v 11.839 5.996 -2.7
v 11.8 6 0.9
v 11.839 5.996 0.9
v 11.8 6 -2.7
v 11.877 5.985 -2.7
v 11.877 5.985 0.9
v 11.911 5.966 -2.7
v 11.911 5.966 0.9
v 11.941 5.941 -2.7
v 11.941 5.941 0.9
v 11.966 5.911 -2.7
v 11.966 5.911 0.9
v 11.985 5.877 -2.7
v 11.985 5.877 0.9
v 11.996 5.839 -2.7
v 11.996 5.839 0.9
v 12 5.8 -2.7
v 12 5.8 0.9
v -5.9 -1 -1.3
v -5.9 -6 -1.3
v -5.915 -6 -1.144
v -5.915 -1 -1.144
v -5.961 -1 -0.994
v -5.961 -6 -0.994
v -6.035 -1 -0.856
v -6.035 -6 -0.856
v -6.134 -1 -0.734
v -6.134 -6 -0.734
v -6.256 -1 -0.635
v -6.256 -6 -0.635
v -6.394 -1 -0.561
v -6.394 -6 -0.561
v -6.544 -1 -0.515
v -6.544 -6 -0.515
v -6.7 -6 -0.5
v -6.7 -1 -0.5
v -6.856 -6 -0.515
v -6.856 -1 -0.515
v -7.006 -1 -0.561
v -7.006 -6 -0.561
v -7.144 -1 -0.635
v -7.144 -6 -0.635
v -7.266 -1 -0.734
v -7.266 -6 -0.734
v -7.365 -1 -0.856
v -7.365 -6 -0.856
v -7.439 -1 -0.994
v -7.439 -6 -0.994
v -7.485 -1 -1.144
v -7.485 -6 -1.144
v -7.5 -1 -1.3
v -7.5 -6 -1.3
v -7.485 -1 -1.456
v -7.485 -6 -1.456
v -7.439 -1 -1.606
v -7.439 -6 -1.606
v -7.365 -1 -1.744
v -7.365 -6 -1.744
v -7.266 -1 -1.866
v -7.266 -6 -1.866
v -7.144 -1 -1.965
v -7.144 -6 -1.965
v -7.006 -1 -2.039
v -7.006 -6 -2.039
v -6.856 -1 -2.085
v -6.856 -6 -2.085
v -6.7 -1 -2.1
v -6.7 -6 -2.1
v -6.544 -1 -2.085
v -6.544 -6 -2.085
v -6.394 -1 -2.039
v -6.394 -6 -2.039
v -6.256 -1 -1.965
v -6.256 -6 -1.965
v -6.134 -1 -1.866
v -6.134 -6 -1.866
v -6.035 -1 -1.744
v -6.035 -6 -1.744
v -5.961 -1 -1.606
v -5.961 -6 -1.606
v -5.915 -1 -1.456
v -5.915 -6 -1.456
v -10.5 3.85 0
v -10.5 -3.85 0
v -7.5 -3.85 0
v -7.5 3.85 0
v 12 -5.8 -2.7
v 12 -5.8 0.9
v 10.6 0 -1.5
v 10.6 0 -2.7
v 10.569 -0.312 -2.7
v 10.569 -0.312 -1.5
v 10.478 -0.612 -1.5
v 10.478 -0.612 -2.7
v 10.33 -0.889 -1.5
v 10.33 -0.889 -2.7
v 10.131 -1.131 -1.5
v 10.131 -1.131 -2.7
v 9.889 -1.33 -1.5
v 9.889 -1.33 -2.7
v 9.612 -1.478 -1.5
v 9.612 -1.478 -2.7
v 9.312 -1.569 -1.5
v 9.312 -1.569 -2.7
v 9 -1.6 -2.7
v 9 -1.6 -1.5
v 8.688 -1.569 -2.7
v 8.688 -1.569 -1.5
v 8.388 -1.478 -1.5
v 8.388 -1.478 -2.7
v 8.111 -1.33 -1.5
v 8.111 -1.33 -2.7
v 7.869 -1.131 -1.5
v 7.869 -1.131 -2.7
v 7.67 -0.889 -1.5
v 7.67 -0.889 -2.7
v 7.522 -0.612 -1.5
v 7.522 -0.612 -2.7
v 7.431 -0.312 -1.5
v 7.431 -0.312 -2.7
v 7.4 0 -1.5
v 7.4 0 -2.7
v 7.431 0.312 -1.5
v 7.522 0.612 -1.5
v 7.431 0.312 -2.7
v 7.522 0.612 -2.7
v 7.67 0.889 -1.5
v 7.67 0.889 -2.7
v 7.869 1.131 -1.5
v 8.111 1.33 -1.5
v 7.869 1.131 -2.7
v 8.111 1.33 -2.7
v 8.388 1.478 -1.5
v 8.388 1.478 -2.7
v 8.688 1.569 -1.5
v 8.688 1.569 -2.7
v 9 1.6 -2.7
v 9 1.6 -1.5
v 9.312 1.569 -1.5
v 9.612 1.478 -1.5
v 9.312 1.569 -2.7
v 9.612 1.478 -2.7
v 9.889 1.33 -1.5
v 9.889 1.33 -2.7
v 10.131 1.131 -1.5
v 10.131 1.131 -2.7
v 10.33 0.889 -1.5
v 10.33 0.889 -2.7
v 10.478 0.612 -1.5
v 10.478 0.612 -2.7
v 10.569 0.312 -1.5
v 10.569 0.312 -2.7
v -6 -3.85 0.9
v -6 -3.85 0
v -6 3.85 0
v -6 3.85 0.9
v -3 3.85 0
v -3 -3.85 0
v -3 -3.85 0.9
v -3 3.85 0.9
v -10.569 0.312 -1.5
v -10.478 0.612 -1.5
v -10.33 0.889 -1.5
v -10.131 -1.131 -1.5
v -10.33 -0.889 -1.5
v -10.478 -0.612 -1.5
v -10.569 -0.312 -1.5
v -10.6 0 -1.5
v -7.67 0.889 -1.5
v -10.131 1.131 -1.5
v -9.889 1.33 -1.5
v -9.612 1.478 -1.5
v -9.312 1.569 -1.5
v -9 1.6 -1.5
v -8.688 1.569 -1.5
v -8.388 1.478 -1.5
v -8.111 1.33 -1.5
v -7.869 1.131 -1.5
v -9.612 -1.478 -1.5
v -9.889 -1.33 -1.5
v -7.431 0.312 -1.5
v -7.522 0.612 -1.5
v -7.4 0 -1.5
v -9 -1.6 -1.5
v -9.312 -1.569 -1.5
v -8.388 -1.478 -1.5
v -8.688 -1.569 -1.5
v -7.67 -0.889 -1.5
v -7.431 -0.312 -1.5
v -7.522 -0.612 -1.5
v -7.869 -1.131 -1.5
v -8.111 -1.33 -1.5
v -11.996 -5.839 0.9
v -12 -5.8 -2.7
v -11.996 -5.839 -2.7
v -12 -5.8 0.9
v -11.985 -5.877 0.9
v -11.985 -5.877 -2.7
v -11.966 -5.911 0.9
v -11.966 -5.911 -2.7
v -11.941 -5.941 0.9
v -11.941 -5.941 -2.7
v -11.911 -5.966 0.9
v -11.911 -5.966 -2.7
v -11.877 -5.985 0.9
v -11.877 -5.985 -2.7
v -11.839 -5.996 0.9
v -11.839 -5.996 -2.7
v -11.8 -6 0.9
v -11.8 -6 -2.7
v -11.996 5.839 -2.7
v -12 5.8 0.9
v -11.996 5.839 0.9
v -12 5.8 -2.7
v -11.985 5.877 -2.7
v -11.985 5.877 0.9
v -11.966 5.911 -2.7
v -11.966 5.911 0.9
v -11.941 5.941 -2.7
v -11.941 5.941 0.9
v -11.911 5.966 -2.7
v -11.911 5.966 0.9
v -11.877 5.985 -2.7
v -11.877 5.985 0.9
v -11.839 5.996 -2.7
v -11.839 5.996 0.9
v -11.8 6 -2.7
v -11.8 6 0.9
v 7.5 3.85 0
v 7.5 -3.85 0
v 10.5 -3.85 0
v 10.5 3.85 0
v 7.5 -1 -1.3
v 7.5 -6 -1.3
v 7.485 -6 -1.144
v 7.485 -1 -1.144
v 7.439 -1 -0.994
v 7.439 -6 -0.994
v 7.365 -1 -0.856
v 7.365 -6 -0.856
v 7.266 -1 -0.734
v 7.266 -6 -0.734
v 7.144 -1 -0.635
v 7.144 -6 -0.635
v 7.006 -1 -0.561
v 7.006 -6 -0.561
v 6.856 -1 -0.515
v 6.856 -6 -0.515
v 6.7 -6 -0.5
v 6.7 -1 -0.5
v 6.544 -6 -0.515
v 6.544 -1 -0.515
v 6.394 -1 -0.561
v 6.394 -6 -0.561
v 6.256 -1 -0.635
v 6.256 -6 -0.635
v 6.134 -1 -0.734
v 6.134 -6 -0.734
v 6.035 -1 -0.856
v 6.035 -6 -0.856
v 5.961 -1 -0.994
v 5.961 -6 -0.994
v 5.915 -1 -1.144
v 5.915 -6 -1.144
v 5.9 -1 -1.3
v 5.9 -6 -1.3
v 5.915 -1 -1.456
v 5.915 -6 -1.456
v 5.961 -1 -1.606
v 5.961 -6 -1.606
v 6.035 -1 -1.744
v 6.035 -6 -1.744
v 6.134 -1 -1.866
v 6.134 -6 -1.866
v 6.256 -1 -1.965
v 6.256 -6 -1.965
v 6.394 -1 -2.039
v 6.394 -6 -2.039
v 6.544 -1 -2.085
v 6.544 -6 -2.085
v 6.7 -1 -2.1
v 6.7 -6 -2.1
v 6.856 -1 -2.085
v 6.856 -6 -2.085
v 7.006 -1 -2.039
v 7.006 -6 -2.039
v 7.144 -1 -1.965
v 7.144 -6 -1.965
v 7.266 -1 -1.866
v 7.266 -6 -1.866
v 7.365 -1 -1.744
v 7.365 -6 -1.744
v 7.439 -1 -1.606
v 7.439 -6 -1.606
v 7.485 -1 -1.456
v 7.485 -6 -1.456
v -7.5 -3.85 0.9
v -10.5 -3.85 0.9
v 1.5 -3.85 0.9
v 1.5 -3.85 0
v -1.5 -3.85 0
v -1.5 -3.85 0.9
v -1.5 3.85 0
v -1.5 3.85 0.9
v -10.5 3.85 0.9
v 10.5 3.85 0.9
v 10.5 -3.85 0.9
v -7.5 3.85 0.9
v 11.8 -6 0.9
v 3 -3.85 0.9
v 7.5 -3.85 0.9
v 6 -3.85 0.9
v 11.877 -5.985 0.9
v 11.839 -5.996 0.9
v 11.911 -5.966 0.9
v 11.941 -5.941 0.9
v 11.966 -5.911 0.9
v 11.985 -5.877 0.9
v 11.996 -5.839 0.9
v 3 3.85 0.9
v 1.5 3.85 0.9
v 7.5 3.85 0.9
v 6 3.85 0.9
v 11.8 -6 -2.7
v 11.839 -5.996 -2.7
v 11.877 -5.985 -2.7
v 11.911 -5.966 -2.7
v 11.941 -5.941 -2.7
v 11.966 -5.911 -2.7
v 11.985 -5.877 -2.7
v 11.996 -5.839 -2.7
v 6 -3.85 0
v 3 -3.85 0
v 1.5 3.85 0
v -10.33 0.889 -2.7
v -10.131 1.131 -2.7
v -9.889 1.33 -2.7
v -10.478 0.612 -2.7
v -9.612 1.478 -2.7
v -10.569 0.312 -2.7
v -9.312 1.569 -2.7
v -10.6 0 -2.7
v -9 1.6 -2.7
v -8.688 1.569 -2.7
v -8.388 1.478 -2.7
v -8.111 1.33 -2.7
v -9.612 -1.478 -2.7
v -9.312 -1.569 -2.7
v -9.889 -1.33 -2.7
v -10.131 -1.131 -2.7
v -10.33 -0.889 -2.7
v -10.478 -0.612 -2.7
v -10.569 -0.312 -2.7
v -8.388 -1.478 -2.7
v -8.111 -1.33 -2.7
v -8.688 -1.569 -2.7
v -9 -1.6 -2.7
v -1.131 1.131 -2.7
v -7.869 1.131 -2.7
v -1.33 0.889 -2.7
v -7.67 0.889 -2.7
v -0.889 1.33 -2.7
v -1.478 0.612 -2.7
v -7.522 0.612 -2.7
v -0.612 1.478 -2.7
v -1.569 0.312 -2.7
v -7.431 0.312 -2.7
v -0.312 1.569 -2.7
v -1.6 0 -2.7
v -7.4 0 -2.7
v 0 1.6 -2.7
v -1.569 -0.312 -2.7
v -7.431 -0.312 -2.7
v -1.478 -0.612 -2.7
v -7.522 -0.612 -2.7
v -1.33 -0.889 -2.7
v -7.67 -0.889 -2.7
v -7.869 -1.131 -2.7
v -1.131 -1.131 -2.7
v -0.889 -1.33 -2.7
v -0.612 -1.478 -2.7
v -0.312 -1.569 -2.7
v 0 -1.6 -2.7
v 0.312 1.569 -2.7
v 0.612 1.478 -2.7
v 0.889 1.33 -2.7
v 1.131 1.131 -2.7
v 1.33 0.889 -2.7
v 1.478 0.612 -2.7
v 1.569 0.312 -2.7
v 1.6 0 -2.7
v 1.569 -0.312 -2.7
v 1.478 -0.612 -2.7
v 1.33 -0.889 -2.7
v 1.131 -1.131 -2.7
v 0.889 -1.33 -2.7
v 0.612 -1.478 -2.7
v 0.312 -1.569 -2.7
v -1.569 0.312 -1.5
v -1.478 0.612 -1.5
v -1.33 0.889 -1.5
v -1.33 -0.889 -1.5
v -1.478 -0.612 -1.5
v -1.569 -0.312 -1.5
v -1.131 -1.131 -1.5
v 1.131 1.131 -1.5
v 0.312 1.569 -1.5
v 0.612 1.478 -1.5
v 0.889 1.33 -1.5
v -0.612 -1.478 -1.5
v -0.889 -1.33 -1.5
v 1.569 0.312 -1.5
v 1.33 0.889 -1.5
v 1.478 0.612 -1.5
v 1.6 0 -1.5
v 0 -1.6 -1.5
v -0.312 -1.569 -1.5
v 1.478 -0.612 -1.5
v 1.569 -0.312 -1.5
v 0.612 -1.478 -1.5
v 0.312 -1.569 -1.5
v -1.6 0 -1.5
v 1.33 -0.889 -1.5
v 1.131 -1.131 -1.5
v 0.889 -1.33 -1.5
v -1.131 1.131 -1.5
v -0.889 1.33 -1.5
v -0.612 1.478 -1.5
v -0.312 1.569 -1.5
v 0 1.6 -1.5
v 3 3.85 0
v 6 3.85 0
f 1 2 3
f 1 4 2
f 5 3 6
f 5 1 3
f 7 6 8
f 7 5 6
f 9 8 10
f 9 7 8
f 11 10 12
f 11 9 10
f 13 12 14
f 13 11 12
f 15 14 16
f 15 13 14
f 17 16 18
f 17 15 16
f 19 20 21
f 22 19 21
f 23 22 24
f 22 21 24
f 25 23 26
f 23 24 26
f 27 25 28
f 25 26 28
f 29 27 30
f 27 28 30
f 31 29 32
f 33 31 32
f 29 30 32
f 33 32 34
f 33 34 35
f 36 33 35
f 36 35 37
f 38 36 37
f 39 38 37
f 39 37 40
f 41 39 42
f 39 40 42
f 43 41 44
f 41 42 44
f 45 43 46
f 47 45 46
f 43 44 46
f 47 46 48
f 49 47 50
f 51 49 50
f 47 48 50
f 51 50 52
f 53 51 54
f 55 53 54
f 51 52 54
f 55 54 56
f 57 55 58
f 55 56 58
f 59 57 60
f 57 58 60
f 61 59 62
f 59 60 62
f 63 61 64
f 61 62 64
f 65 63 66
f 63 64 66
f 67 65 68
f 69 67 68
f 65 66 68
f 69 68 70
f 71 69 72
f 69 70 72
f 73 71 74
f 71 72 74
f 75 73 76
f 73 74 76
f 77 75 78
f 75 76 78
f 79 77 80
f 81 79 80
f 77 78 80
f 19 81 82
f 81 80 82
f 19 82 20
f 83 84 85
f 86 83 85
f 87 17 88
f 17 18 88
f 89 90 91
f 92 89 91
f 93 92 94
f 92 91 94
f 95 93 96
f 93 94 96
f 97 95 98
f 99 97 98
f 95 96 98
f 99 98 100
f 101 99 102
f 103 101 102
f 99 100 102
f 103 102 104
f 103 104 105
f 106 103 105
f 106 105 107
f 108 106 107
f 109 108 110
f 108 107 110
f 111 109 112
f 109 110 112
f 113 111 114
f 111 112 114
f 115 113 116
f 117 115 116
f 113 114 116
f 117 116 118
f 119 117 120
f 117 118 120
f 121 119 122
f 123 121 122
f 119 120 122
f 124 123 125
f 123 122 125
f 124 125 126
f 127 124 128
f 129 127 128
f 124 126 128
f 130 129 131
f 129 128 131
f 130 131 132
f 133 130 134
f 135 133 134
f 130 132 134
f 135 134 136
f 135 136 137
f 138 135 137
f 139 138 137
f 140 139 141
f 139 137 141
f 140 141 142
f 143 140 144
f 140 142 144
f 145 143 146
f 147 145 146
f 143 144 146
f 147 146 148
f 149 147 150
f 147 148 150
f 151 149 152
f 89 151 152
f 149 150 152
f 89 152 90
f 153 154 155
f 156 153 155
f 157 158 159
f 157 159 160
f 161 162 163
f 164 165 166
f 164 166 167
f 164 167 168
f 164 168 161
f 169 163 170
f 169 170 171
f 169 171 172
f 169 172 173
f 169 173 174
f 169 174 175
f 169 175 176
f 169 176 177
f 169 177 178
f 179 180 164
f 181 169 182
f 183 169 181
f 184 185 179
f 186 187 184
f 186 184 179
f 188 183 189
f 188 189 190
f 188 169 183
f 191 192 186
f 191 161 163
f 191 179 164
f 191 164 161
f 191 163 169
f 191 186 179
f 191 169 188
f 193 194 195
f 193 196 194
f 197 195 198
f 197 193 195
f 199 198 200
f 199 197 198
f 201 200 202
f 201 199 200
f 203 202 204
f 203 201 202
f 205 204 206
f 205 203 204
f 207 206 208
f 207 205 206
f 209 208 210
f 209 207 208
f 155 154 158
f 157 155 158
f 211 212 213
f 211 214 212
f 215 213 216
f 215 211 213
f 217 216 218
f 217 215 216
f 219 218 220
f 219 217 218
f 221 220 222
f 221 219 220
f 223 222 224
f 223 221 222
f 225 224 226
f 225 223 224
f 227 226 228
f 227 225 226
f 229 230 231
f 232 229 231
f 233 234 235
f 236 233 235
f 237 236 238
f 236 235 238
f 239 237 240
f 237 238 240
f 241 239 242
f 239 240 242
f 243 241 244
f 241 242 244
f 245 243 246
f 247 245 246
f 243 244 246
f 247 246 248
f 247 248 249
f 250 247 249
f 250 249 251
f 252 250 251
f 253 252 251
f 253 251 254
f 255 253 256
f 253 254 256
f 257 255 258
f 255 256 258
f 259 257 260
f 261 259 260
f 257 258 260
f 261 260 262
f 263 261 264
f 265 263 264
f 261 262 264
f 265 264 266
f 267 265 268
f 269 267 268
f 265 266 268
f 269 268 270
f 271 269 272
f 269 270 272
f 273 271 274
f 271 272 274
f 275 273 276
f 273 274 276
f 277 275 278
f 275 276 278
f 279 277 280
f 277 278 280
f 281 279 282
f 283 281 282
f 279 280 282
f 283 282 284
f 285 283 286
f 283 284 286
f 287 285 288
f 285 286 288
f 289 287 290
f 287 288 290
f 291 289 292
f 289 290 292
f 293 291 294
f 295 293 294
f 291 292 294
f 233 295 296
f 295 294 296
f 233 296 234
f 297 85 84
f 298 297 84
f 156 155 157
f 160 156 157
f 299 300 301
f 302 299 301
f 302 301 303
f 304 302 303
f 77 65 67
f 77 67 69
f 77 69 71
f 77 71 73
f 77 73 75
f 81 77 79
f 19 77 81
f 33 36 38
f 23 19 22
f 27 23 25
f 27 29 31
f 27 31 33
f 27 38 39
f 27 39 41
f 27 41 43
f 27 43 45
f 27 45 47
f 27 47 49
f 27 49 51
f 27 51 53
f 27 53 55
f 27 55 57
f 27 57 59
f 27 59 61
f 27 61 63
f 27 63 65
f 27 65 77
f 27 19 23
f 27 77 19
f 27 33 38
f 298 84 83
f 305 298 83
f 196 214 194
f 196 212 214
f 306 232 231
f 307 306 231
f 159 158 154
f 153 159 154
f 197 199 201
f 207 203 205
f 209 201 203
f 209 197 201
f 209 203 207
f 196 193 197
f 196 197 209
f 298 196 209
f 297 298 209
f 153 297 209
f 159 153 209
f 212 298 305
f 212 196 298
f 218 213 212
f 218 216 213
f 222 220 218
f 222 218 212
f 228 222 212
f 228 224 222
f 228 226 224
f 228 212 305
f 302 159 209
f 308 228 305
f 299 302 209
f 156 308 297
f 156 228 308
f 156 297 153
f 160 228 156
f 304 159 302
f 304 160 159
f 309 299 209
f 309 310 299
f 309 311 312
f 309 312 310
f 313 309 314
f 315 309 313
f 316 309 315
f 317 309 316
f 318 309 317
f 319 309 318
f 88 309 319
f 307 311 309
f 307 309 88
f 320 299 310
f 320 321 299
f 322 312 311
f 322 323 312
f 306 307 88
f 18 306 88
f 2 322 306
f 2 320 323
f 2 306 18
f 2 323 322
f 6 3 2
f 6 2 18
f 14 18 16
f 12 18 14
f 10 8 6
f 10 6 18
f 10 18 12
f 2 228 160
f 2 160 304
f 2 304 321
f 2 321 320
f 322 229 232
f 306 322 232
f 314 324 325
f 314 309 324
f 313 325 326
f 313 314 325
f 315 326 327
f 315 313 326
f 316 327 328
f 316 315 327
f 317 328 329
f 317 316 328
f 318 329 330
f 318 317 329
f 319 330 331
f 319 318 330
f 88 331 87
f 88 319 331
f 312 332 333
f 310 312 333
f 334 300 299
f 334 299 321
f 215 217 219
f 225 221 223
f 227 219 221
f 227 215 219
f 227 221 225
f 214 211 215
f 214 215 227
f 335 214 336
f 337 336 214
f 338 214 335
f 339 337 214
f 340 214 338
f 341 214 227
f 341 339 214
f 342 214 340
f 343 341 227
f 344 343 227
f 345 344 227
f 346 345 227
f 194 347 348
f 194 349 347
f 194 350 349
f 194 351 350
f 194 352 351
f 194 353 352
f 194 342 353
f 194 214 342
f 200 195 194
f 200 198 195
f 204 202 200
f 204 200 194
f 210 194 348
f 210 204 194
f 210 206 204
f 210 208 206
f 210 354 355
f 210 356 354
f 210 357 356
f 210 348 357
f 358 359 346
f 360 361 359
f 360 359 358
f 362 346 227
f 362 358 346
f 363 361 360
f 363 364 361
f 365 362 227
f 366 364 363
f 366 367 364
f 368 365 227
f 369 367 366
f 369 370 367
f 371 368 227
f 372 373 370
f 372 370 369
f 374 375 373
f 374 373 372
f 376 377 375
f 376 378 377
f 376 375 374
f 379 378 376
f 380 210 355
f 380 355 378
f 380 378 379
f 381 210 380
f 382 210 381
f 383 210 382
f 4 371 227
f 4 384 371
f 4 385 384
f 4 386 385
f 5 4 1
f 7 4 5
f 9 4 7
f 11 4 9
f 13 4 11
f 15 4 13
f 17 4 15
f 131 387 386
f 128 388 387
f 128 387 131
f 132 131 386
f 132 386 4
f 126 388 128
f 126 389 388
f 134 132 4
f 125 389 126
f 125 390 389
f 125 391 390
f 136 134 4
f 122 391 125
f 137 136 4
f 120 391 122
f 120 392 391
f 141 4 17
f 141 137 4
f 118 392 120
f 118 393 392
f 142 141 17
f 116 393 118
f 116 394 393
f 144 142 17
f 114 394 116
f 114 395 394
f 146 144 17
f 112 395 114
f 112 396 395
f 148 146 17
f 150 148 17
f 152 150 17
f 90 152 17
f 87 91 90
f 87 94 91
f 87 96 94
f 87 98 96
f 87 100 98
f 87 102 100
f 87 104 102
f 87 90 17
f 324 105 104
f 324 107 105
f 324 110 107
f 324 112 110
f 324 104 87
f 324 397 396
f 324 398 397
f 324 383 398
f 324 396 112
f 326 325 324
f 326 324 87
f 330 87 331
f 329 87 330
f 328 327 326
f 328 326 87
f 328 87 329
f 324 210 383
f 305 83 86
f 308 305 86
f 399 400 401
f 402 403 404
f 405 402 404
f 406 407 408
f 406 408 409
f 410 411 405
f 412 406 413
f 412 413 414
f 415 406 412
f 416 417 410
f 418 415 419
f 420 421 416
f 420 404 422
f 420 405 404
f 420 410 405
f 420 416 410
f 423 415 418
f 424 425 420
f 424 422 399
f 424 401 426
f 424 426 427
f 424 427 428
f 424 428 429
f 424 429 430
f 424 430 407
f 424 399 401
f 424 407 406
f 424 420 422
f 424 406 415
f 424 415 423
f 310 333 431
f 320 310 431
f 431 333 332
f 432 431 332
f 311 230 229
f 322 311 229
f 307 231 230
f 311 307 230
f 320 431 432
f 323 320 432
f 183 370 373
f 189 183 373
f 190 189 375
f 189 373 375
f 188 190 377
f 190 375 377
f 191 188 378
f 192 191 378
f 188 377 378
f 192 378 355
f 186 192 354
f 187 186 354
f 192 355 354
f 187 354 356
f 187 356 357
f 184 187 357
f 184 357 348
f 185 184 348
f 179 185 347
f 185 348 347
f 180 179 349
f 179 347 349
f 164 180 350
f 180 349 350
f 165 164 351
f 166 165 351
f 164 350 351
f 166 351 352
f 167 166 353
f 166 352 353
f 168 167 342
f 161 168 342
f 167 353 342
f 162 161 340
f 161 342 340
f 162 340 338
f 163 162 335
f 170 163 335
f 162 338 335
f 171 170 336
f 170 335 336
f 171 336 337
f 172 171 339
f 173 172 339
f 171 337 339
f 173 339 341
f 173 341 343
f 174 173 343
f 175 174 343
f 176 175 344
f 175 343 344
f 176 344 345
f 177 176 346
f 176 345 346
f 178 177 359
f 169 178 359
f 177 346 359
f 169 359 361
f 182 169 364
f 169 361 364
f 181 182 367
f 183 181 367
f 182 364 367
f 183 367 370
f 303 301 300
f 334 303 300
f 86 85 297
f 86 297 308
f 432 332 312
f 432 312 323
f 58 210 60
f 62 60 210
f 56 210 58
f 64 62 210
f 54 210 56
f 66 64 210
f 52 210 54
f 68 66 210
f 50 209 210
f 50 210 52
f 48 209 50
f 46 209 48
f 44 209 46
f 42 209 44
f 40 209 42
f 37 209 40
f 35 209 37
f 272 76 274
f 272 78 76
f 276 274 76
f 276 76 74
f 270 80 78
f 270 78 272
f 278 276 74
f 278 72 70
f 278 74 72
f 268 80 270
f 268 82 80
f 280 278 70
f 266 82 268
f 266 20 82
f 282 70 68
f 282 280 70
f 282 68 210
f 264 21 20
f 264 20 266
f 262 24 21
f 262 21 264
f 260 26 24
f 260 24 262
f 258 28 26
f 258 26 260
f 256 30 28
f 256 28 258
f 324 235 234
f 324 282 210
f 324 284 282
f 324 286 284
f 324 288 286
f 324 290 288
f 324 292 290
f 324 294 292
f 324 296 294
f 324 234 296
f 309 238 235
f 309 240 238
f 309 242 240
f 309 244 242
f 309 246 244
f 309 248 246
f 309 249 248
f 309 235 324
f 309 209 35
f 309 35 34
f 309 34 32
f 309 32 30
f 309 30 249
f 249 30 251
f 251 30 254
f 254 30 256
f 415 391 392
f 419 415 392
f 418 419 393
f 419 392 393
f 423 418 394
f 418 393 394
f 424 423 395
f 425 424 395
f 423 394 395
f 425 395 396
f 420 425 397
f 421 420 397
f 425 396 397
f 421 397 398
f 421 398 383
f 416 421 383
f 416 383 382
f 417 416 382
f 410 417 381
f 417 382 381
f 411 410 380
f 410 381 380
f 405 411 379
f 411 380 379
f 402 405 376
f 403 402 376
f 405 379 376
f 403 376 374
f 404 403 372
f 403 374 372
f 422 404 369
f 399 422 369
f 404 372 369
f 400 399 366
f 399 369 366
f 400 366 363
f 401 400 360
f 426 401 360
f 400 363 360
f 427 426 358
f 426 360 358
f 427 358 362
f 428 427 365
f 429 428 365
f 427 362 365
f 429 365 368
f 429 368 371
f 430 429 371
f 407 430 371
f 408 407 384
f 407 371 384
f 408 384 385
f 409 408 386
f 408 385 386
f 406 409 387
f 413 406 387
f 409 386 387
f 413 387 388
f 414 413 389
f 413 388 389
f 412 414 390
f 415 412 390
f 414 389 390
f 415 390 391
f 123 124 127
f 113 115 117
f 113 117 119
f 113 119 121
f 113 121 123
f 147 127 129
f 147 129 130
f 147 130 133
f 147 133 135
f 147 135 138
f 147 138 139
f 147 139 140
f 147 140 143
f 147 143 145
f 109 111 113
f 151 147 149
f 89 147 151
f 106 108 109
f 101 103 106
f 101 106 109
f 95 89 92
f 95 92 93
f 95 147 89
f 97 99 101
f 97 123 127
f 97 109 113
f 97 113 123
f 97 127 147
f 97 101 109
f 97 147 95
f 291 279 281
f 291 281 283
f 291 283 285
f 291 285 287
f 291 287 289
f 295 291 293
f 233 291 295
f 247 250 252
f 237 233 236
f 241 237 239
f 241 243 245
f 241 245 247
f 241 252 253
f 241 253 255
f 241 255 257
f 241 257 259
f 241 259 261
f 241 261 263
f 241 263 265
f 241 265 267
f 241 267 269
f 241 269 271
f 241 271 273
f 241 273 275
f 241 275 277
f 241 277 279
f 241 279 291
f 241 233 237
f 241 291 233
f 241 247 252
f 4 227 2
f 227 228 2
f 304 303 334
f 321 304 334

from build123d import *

# Parameters (mm, degrees)
F0_W     = 24
F0_H     = 12
F0_W_2   = 1.5
F0_H_2   = 7.7
F1_DEPTH = 0.9
F2_W     = 24
F2_H     = 12
F3_DEPTH = 2.7
F4_R     = 1.6
F5_DEPTH = 1.2
F6_R     = 0.2
F7_R     = 0.8
F8_DEPTH = 5


with BuildPart() as f1:
    # F0 (on Top) → F1 (new body)
    with BuildSketch(Plane.XY):
        Rectangle(F0_W, F0_H)
        Polygon((-10.5, -3.85), (-10.5, 3.85), (-7.5, 3.85), (-6, 3.85), (-3, 3.85), (-1.5, 3.85), (1.5, 3.85), (3, 3.85), (6, 3.85), (7.5, 3.85), (10.5, 3.85), (10.5, -3.85), (7.5, -3.85), (6, -3.85), (3, -3.85), (1.5, -3.85), (-1.5, -3.85), (-3, -3.85), (-6, -3.85), (-7.5, -3.85), align=None, mode=Mode.SUBTRACT)
        with Locations((-6.75, 0)):
            Rectangle(F0_W_2, F0_H_2)
        with Locations((-2.25, 0)):
            Rectangle(F0_W_2, F0_H_2)
        with Locations((2.25, 0)):
            Rectangle(F0_W_2, F0_H_2)
        with Locations((6.75, 0)):
            Rectangle(F0_W_2, F0_H_2)
    extrude(amount=F1_DEPTH)

    # F2 (on face) → F3 (join)
    with BuildSketch(Plane(origin=(0, 0, 0), x_dir=(1, 0, 0), z_dir=(0, 0, -1))):
        Rectangle(F2_W, F2_H)
    extrude(amount=F3_DEPTH)

    # F4 (on face) → F5 (cut)
    with BuildSketch(Plane(origin=(0, 0, -2.7), x_dir=(1, 0, 0), z_dir=(0, 0, -1))):
        Circle(F4_R)
        with Locations((9, 0)):
            Circle(F4_R)
        with Locations((-9, 0)):
            Circle(F4_R)
    extrude(amount=-F5_DEPTH, mode=Mode.SUBTRACT)

    # F6
    f6_edges = [f1.edges().sort_by_distance(p)[0] for p in [
        (-12, -6, -0.9),
        (12, -6, -0.9),
        (12, 6, -0.9),
        (-12, 6, -0.9),
    ]]
    fillet(f6_edges, radius=F6_R)

    # F7 (on face) → F8 (cut)
    with BuildSketch(Plane.XZ.offset(6)):
        with Locations((-6.7, -1.3)):
            Circle(F7_R)
        with Locations((6.7, -1.3)):
            Circle(F7_R)
    extrude(amount=-F8_DEPTH, mode=Mode.SUBTRACT)


solid = f1.part
